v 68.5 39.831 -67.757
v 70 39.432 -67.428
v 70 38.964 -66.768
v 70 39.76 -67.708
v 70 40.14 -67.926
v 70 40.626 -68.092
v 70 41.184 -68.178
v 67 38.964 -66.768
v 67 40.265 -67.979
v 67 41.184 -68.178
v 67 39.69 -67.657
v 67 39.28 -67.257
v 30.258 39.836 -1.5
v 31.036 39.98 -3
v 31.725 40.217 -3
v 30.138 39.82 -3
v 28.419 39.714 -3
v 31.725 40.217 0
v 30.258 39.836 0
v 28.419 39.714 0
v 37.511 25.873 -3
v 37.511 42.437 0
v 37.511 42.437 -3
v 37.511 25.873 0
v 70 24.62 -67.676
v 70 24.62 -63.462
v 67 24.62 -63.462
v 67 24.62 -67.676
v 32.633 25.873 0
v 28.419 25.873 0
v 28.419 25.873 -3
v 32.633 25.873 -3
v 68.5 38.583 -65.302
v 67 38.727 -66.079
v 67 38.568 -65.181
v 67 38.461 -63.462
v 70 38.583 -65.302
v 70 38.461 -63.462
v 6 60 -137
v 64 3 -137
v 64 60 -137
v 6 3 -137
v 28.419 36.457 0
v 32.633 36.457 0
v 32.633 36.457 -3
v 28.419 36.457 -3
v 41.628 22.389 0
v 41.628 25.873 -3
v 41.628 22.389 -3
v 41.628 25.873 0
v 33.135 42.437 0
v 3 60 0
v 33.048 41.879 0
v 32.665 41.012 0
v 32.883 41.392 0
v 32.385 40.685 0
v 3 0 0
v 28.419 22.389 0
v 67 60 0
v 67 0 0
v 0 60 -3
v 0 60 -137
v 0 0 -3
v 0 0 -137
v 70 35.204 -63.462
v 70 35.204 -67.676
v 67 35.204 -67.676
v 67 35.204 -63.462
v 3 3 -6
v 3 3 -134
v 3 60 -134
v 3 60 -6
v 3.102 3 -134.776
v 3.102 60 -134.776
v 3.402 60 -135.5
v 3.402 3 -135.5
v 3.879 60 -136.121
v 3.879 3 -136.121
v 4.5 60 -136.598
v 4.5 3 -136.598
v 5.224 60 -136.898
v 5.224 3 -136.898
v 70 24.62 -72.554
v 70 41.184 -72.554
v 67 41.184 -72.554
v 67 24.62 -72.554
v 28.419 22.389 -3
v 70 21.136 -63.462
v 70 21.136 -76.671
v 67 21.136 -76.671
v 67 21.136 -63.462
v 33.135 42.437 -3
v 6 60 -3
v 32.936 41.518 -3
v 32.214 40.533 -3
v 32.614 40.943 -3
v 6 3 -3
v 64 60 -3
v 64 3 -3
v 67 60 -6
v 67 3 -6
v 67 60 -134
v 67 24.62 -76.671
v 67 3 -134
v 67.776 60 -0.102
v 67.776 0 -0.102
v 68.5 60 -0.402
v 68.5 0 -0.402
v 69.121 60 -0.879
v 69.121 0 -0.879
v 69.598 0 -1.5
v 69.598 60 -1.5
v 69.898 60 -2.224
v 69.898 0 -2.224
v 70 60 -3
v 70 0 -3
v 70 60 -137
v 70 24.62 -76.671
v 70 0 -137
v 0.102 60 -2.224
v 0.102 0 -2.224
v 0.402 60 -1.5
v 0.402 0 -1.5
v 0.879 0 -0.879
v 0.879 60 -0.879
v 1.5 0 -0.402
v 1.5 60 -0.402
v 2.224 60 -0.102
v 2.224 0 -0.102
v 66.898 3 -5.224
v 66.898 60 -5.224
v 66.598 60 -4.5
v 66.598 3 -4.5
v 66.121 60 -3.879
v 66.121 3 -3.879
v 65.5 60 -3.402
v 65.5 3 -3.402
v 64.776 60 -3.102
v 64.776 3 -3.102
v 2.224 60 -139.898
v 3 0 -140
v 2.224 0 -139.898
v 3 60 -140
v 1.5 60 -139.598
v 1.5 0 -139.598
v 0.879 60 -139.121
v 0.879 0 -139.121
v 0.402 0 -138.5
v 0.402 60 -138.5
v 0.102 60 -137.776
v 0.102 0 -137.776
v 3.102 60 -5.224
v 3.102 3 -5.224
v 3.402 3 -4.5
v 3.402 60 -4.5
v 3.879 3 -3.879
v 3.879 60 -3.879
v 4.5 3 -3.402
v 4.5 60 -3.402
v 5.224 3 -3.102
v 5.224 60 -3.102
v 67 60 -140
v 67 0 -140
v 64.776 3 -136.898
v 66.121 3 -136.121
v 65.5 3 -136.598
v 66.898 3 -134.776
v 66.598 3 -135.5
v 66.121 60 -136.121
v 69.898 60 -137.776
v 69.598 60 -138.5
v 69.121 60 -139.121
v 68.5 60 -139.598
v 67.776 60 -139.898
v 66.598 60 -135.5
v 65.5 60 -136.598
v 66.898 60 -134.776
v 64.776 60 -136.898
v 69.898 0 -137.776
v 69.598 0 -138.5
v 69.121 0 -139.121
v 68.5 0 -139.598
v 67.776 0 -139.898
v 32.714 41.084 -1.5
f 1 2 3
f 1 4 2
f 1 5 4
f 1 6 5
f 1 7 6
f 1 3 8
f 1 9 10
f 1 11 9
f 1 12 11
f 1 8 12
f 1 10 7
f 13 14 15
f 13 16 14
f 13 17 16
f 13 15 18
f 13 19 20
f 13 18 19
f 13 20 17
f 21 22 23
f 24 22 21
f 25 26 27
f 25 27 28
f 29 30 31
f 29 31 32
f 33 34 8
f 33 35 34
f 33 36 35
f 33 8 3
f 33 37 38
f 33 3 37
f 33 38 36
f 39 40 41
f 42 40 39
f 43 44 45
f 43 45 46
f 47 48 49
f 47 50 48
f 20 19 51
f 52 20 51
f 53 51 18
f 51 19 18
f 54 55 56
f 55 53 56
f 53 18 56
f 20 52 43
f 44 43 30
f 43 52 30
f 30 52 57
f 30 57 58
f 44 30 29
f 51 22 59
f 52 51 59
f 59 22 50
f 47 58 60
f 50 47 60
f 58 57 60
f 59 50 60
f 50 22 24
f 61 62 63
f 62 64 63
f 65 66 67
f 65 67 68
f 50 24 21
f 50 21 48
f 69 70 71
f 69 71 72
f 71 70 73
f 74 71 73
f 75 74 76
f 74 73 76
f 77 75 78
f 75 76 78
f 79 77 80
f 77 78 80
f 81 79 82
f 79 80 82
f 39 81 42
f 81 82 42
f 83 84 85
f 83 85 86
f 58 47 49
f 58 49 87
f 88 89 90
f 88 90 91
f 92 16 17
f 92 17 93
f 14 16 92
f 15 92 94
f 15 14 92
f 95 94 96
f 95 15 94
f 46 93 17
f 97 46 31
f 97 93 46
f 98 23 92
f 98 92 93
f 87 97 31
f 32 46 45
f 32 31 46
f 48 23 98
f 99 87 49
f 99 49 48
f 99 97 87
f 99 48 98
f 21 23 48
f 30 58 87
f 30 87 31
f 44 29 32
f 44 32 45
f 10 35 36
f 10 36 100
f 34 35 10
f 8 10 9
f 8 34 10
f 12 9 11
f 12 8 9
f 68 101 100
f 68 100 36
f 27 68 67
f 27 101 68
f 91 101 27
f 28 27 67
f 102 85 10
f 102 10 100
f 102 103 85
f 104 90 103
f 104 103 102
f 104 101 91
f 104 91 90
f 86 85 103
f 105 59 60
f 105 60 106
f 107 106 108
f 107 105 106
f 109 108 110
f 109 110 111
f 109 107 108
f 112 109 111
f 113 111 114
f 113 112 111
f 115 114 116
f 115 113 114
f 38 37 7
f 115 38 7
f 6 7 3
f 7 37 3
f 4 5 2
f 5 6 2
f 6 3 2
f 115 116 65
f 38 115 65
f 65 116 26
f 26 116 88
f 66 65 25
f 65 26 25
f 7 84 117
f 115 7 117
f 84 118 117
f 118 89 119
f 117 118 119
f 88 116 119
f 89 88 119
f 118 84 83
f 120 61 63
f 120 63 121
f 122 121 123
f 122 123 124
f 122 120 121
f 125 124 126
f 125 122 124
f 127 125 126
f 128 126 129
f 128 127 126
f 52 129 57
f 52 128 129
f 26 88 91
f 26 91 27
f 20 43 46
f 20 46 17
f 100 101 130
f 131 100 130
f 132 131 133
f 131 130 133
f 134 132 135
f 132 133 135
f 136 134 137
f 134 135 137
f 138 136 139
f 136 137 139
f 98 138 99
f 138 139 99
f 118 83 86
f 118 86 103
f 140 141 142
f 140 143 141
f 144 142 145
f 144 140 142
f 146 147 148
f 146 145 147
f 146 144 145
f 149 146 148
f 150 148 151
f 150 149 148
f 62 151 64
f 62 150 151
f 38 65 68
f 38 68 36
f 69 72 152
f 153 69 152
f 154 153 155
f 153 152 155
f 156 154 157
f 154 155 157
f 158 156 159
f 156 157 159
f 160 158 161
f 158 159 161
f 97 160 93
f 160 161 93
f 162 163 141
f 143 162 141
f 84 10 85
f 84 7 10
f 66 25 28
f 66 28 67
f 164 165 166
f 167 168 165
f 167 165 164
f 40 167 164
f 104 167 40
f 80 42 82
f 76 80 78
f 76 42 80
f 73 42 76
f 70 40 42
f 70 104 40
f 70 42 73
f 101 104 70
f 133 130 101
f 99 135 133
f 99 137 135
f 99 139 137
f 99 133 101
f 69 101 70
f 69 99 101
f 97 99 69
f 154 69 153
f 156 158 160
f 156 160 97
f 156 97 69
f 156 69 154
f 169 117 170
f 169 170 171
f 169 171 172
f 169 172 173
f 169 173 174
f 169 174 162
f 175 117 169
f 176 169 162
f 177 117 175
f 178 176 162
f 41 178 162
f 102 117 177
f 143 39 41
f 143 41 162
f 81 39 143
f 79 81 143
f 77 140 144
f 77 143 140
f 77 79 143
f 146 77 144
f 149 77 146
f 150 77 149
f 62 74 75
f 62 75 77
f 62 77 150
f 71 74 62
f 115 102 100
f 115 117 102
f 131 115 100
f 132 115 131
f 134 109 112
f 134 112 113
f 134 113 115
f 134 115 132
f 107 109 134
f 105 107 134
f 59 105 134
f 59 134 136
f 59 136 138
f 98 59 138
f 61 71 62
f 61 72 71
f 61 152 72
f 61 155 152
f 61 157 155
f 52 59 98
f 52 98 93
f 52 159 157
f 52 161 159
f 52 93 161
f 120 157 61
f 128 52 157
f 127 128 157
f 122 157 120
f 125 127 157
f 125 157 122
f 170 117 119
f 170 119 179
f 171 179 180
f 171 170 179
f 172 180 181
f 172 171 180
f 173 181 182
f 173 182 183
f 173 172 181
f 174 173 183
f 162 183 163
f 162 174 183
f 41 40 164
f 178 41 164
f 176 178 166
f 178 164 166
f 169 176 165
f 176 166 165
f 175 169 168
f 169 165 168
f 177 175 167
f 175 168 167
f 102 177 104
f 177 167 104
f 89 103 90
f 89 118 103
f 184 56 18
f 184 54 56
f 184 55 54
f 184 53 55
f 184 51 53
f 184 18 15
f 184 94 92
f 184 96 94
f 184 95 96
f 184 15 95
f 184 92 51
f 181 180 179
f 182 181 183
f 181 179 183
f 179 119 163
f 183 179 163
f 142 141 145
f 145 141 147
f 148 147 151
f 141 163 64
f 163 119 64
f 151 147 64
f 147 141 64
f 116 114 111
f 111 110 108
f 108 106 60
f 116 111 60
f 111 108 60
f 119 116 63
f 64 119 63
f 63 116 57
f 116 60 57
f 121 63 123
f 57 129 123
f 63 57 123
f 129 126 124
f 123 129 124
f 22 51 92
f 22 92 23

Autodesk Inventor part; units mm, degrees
ref_plane "YZ Plane" through (0, 0, 0) normal (1, 0, 0) x (0, 1, 0)
ref_plane "XZ Plane" through (0, 0, 0) normal (0, 1, 0) x (-1, 0, 0)
ref_plane "XY Plane" through (0, 0, 0) normal (0, 0, 1) x (1, 0, 0)
sketch "Эскиз1" plane through (0, 0, 0) normal (0, 1, 0) x (-1, 0, 0)
  line L0 (0, 0) -> (-70, 0)
  line L1 (-70, 0) -> (-70, -140)
  line L2 (-70, -140) -> (0, -140)
  line L3 (0, -140) -> (0, 0)
  dimension "d0" = 70
  dimension "d1" = 140
extrude "Выдавливание1" add sketch "Эскиз1" along normal blind 60
shell "Оболочка1" thickness 3 removed faces 1 at (46.6667, 60, -93.3333)
sketch "Эскиз2" plane through (70, 0, 0) normal (1, 0, 0) x (0, 0, -1)
  line L0 (0, 60) -> (140, 60) projected
  line L1 (60.8364, 41.1842) -> (78.3566, 41.1842) construction
  line L2 (78.3566, 41.1842) -> (78.3566, 21.1356) construction
  line L3 (78.3566, 21.1356) -> (60.8364, 21.1356) construction
  line L4 (60.8364, 21.1356) -> (60.8364, 41.1842) construction
  line L5 (76.6711, 21.1356) -> (63.462, 21.1356)
  line L6 (63.462, 21.1356) -> (63.462, 24.6202)
  line L7 (63.462, 24.6202) -> (67.6759, 24.6202)
  line L8 (67.6759, 24.6202) -> (67.6759, 35.2037)
  line L9 (67.6759, 35.2037) -> (63.462, 35.2037)
  line L10 (63.462, 35.2037) -> (63.462, 38.4614)
  spline S0 degree 2 poles (63.462, 38.4614) (64.3858, 38.4614) (66.2172, 38.7045) (66.7683, 38.9638) knots 0 0 0 1 2 2 2
  spline S1 degree 2 poles (66.7683, 38.9638) (67.4004, 39.288) (68.1135, 40.3739) (68.1784, 41.1842) knots 0 0 0 1 2 2 2
  line L11 (68.1784, 41.1842) -> (72.5544, 41.1842)
  line L12 (72.5544, 41.1842) -> (72.5544, 24.6202)
  line L13 (72.5544, 24.6202) -> (76.6711, 24.6202)
  line L14 (76.6711, 24.6202) -> (76.6711, 21.1356)
  point P0 (0, 0)
  point P1 (70, 30.2829)
extrude "Выдавливание2" cut sketch "Эскиз2" against normal blind 12
sketch "Эскиз3" plane through (0, 0, 0) normal (0, 0, 1) x (1, 0, 0)
  line L0 (0, 60) -> (70, 60) projected
  line L1 (25.7932, 42.4372) -> (43.3135, 42.4372) construction
  line L2 (43.3135, 42.4372) -> (43.3135, 22.3886) construction
  line L3 (43.3135, 22.3886) -> (25.7932, 22.3886) construction
  line L4 (25.7932, 22.3886) -> (25.7932, 42.4372) construction
  line L5 (41.6279, 22.3886) -> (28.4189, 22.3886)
  line L6 (28.4189, 22.3886) -> (28.4189, 25.8732)
  line L7 (28.4189, 25.8732) -> (32.6328, 25.8732)
  line L8 (32.6328, 25.8732) -> (32.6328, 36.4566)
  line L9 (32.6328, 36.4566) -> (28.4189, 36.4566)
  line L10 (28.4189, 36.4566) -> (28.4189, 39.7143)
  spline S0 degree 2 poles (28.4189, 39.7143) (29.3427, 39.7143) (31.1741, 39.9575) (31.7252, 40.2168) knots 0 0 0 1 2 2 2
  spline S1 degree 2 poles (31.7252, 40.2168) (32.3573, 40.5409) (33.0704, 41.6268) (33.1352, 42.4372) knots 0 0 0 1 2 2 2
  line L11 (33.1352, 42.4372) -> (37.5112, 42.4372)
  line L12 (37.5112, 42.4372) -> (37.5112, 25.8732)
  line L13 (37.5112, 25.8732) -> (41.6279, 25.8732)
  line L14 (41.6279, 25.8732) -> (41.6279, 22.3886)
  point P0 (0, 0)
  point P1 (35, 31.2439)
extrude "Выдавливание3" cut sketch "Эскиз3" against normal blind 12
fillet "Сопряжение1" radius 3 4 edges at (3, 31.5, -3) (67, 31.5, -3) (3, 31.5, -137) (67, 31.5, -137)
fillet "Сопряжение2" radius 3 4 edges at (0, 30, -140) (0, 30, 0) (70, 30, -140) (70, 30, 0)
properties part number "Контейнер 1"
